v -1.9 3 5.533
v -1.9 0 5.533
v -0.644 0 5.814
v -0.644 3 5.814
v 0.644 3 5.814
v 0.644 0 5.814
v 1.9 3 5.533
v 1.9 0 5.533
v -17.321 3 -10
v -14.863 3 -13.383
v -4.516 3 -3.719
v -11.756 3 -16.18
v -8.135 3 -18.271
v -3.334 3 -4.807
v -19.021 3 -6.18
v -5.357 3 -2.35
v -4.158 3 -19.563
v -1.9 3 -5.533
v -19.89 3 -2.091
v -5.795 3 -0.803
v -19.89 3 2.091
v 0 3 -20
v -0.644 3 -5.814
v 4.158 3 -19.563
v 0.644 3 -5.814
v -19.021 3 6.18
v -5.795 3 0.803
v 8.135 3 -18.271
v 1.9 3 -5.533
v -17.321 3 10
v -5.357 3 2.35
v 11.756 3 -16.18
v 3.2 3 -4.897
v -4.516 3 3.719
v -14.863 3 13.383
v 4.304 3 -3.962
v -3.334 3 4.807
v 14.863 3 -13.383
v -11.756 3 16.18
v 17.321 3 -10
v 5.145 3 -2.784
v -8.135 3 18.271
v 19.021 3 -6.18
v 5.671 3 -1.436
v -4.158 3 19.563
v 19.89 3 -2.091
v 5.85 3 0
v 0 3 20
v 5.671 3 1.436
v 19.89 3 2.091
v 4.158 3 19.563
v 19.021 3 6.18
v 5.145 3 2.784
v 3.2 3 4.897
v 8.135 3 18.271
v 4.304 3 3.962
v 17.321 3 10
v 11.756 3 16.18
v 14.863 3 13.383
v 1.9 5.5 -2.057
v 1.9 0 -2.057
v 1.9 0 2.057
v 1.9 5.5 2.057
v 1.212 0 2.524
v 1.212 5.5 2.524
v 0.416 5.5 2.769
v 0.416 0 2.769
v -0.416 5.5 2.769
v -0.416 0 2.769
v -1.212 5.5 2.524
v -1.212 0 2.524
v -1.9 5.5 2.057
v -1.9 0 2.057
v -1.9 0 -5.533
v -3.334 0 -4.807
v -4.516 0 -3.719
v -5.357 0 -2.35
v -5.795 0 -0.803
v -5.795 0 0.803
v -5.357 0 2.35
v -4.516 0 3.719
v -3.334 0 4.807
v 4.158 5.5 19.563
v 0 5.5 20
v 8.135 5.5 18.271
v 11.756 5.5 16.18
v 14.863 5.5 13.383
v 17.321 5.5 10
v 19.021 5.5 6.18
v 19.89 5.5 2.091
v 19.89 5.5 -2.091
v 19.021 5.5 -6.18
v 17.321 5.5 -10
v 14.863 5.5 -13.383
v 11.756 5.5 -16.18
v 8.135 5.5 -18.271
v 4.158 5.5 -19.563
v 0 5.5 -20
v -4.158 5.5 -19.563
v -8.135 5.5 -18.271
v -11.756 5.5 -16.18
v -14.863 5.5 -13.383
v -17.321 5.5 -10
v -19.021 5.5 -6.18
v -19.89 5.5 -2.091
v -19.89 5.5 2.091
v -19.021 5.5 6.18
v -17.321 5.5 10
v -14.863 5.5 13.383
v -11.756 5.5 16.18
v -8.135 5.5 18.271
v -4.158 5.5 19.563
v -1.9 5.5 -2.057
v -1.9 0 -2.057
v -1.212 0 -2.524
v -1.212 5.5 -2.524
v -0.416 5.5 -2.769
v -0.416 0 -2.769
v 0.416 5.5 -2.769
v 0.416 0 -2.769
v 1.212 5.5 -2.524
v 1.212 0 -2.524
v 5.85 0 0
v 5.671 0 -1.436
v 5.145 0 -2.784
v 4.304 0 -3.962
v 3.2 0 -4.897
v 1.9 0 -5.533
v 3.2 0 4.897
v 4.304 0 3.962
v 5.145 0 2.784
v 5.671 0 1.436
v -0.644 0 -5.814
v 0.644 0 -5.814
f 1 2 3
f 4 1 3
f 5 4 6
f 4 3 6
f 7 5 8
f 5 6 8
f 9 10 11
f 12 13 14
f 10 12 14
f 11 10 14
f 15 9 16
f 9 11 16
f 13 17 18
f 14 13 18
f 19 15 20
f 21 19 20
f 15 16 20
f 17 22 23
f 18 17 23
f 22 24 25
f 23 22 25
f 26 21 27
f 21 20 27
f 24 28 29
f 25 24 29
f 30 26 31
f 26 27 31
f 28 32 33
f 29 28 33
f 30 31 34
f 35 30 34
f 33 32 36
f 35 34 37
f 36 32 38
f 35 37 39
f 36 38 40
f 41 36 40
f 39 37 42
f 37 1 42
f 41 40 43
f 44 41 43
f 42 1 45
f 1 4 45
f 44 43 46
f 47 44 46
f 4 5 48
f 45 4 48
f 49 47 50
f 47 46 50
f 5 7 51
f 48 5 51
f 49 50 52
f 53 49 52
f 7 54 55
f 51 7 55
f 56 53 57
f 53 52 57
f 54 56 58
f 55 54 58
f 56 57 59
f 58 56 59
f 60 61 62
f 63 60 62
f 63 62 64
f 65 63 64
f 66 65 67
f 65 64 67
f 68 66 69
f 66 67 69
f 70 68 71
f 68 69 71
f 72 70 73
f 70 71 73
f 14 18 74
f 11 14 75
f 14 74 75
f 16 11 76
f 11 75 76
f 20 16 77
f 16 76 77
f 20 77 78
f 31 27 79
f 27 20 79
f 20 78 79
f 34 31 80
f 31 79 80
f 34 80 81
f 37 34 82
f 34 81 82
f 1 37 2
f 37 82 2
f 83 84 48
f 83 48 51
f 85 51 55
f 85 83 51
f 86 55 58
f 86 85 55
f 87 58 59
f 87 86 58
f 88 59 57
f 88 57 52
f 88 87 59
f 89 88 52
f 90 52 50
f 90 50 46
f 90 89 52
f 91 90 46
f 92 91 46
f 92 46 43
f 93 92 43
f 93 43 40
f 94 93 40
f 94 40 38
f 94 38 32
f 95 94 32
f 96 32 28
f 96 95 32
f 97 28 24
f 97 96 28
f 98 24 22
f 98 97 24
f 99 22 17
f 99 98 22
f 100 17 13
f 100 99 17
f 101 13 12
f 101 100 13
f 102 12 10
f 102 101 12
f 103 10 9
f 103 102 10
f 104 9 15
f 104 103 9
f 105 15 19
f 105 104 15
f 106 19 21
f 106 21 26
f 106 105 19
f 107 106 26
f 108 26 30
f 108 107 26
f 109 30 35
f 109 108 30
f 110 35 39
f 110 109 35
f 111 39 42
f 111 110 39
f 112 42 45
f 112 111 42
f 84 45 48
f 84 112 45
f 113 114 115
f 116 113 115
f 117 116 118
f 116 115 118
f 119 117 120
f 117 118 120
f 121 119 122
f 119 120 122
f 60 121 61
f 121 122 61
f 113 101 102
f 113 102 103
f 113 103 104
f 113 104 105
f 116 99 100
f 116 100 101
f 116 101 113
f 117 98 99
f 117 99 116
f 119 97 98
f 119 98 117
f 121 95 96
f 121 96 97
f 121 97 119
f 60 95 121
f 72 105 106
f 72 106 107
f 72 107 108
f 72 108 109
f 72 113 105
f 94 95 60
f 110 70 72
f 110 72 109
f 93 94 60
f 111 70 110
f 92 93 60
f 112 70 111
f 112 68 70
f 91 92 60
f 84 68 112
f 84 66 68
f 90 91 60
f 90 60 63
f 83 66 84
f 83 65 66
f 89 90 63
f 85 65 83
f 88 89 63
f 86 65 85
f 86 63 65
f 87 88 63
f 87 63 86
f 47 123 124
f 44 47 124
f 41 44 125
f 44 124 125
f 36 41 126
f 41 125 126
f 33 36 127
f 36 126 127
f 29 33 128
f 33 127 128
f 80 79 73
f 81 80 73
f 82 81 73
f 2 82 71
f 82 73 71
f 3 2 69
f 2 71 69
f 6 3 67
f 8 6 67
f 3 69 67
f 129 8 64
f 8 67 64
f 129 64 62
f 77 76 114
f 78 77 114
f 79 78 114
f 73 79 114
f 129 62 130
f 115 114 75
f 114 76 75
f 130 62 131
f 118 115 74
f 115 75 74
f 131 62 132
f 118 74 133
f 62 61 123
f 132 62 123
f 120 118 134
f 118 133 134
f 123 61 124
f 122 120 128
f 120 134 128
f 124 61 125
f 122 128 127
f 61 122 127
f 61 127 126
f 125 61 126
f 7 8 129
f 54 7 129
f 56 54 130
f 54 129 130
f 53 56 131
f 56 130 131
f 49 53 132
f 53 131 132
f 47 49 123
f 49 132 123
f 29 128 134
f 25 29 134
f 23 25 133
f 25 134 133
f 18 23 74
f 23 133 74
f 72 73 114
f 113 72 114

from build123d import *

# Parameters (mm, degrees)
BOSS_EXTRUDE1_DEPTH = 5.5
SKETCH2_R           = 20
BOSS_EXTRUDE2_DEPTH = 2.5
CUT_EXTRUDE1_DEPTH  = 8


with BuildPart() as part:
    # Sketch1 → Boss-Extrude1 (new body)
    with BuildSketch(Plane(origin=(0, 0, 0), x_dir=(1, 0, 0), z_dir=(0, 1, 0))):
        with BuildLine():
            ThreePointArc((-1.9, -2.05669638), (-2.8, 0), (-1.9, 2.05669638))
            Line((-1.9, 2.05669638), (-1.9, 5.532856405))
            ThreePointArc((-1.9, 5.532856405), (-5.85, 0), (-1.9, -5.532856405))
            Line((-1.9, -5.532856405), (-1.9, -2.05669638))
        make_face()
        with BuildLine():
            ThreePointArc((-1.9, 2.05669638), (0, 2.8), (1.9, 2.05669638))
            Line((1.9, 2.05669638), (1.9, 5.532856405))
            ThreePointArc((1.9, 5.532856405), (0, 5.85), (-1.9, 5.532856405))
            Line((-1.9, 5.532856405), (-1.9, 2.05669638))
        make_face()
        with BuildLine():
            Line((1.9, 5.532856405), (1.9, 2.05669638))
            ThreePointArc((1.9, 2.05669638), (2.565151068, 1.122497216), (2.8, 0))
            ThreePointArc((2.8, 0), (2.565151068, -1.122497216), (1.9, -2.05669638))
            Line((1.9, -2.05669638), (1.9, -5.532856405))
            ThreePointArc((1.9, -5.532856405), (4.761171074, -3.399080758), (5.85, 0))
            ThreePointArc((5.85, 0), (4.761171074, 3.399080758), (1.9, 5.532856405))
        make_face()
        with BuildLine():
            Line((1.9, -5.532856405), (1.9, -2.05669638))
            ThreePointArc((1.9, -2.05669638), (0, -2.8), (-1.9, -2.05669638))
            Line((-1.9, -2.05669638), (-1.9, -5.532856405))
            ThreePointArc((-1.9, -5.532856405), (0, -5.85), (1.9, -5.532856405))
        make_face()
        with BuildLine():
            Line((-1.9, -2.05669638), (-1.9, 2.05669638))
            ThreePointArc((-1.9, 2.05669638), (-2.8, 0), (-1.9, -2.05669638))
        make_face()
        with BuildLine():
            ThreePointArc((2.8, 0), (2.565151068, 1.122497216), (1.9, 2.05669638))
            Line((1.9, 2.05669638), (1.9, -2.05669638))
            ThreePointArc((1.9, -2.05669638), (2.565151068, -1.122497216), (2.8, 0))
        make_face()
    extrude(amount=BOSS_EXTRUDE1_DEPTH)

    # Sketch2 → Boss-Extrude2 (add)
    with BuildSketch(Plane(origin=(0, 5.5, 0), x_dir=(1, 0, 0), z_dir=(0, 1, 0))):
        with Locations(Location((0, 0, 0), (0, 0, 270))):
            Circle(SKETCH2_R)
    extrude(amount=-BOSS_EXTRUDE2_DEPTH)

    # Sketch3 → Cut-Extrude1 (cut)
    with BuildSketch(Plane.XZ.offset(-3)):
        with BuildLine():
            Line((-1.9, 2.05669638), (-1.9, -2.05669638))
            ThreePointArc((-1.9, -2.05669638), (0, -2.8), (1.9, -2.05669638))
            Line((1.9, -2.05669638), (1.9, 2.05669638))
            ThreePointArc((1.9, 2.05669638), (0, 2.8), (-1.9, 2.05669638))
        make_face()
    extrude(amount=-CUT_EXTRUDE1_DEPTH, mode=Mode.SUBTRACT)


solid = part.part
